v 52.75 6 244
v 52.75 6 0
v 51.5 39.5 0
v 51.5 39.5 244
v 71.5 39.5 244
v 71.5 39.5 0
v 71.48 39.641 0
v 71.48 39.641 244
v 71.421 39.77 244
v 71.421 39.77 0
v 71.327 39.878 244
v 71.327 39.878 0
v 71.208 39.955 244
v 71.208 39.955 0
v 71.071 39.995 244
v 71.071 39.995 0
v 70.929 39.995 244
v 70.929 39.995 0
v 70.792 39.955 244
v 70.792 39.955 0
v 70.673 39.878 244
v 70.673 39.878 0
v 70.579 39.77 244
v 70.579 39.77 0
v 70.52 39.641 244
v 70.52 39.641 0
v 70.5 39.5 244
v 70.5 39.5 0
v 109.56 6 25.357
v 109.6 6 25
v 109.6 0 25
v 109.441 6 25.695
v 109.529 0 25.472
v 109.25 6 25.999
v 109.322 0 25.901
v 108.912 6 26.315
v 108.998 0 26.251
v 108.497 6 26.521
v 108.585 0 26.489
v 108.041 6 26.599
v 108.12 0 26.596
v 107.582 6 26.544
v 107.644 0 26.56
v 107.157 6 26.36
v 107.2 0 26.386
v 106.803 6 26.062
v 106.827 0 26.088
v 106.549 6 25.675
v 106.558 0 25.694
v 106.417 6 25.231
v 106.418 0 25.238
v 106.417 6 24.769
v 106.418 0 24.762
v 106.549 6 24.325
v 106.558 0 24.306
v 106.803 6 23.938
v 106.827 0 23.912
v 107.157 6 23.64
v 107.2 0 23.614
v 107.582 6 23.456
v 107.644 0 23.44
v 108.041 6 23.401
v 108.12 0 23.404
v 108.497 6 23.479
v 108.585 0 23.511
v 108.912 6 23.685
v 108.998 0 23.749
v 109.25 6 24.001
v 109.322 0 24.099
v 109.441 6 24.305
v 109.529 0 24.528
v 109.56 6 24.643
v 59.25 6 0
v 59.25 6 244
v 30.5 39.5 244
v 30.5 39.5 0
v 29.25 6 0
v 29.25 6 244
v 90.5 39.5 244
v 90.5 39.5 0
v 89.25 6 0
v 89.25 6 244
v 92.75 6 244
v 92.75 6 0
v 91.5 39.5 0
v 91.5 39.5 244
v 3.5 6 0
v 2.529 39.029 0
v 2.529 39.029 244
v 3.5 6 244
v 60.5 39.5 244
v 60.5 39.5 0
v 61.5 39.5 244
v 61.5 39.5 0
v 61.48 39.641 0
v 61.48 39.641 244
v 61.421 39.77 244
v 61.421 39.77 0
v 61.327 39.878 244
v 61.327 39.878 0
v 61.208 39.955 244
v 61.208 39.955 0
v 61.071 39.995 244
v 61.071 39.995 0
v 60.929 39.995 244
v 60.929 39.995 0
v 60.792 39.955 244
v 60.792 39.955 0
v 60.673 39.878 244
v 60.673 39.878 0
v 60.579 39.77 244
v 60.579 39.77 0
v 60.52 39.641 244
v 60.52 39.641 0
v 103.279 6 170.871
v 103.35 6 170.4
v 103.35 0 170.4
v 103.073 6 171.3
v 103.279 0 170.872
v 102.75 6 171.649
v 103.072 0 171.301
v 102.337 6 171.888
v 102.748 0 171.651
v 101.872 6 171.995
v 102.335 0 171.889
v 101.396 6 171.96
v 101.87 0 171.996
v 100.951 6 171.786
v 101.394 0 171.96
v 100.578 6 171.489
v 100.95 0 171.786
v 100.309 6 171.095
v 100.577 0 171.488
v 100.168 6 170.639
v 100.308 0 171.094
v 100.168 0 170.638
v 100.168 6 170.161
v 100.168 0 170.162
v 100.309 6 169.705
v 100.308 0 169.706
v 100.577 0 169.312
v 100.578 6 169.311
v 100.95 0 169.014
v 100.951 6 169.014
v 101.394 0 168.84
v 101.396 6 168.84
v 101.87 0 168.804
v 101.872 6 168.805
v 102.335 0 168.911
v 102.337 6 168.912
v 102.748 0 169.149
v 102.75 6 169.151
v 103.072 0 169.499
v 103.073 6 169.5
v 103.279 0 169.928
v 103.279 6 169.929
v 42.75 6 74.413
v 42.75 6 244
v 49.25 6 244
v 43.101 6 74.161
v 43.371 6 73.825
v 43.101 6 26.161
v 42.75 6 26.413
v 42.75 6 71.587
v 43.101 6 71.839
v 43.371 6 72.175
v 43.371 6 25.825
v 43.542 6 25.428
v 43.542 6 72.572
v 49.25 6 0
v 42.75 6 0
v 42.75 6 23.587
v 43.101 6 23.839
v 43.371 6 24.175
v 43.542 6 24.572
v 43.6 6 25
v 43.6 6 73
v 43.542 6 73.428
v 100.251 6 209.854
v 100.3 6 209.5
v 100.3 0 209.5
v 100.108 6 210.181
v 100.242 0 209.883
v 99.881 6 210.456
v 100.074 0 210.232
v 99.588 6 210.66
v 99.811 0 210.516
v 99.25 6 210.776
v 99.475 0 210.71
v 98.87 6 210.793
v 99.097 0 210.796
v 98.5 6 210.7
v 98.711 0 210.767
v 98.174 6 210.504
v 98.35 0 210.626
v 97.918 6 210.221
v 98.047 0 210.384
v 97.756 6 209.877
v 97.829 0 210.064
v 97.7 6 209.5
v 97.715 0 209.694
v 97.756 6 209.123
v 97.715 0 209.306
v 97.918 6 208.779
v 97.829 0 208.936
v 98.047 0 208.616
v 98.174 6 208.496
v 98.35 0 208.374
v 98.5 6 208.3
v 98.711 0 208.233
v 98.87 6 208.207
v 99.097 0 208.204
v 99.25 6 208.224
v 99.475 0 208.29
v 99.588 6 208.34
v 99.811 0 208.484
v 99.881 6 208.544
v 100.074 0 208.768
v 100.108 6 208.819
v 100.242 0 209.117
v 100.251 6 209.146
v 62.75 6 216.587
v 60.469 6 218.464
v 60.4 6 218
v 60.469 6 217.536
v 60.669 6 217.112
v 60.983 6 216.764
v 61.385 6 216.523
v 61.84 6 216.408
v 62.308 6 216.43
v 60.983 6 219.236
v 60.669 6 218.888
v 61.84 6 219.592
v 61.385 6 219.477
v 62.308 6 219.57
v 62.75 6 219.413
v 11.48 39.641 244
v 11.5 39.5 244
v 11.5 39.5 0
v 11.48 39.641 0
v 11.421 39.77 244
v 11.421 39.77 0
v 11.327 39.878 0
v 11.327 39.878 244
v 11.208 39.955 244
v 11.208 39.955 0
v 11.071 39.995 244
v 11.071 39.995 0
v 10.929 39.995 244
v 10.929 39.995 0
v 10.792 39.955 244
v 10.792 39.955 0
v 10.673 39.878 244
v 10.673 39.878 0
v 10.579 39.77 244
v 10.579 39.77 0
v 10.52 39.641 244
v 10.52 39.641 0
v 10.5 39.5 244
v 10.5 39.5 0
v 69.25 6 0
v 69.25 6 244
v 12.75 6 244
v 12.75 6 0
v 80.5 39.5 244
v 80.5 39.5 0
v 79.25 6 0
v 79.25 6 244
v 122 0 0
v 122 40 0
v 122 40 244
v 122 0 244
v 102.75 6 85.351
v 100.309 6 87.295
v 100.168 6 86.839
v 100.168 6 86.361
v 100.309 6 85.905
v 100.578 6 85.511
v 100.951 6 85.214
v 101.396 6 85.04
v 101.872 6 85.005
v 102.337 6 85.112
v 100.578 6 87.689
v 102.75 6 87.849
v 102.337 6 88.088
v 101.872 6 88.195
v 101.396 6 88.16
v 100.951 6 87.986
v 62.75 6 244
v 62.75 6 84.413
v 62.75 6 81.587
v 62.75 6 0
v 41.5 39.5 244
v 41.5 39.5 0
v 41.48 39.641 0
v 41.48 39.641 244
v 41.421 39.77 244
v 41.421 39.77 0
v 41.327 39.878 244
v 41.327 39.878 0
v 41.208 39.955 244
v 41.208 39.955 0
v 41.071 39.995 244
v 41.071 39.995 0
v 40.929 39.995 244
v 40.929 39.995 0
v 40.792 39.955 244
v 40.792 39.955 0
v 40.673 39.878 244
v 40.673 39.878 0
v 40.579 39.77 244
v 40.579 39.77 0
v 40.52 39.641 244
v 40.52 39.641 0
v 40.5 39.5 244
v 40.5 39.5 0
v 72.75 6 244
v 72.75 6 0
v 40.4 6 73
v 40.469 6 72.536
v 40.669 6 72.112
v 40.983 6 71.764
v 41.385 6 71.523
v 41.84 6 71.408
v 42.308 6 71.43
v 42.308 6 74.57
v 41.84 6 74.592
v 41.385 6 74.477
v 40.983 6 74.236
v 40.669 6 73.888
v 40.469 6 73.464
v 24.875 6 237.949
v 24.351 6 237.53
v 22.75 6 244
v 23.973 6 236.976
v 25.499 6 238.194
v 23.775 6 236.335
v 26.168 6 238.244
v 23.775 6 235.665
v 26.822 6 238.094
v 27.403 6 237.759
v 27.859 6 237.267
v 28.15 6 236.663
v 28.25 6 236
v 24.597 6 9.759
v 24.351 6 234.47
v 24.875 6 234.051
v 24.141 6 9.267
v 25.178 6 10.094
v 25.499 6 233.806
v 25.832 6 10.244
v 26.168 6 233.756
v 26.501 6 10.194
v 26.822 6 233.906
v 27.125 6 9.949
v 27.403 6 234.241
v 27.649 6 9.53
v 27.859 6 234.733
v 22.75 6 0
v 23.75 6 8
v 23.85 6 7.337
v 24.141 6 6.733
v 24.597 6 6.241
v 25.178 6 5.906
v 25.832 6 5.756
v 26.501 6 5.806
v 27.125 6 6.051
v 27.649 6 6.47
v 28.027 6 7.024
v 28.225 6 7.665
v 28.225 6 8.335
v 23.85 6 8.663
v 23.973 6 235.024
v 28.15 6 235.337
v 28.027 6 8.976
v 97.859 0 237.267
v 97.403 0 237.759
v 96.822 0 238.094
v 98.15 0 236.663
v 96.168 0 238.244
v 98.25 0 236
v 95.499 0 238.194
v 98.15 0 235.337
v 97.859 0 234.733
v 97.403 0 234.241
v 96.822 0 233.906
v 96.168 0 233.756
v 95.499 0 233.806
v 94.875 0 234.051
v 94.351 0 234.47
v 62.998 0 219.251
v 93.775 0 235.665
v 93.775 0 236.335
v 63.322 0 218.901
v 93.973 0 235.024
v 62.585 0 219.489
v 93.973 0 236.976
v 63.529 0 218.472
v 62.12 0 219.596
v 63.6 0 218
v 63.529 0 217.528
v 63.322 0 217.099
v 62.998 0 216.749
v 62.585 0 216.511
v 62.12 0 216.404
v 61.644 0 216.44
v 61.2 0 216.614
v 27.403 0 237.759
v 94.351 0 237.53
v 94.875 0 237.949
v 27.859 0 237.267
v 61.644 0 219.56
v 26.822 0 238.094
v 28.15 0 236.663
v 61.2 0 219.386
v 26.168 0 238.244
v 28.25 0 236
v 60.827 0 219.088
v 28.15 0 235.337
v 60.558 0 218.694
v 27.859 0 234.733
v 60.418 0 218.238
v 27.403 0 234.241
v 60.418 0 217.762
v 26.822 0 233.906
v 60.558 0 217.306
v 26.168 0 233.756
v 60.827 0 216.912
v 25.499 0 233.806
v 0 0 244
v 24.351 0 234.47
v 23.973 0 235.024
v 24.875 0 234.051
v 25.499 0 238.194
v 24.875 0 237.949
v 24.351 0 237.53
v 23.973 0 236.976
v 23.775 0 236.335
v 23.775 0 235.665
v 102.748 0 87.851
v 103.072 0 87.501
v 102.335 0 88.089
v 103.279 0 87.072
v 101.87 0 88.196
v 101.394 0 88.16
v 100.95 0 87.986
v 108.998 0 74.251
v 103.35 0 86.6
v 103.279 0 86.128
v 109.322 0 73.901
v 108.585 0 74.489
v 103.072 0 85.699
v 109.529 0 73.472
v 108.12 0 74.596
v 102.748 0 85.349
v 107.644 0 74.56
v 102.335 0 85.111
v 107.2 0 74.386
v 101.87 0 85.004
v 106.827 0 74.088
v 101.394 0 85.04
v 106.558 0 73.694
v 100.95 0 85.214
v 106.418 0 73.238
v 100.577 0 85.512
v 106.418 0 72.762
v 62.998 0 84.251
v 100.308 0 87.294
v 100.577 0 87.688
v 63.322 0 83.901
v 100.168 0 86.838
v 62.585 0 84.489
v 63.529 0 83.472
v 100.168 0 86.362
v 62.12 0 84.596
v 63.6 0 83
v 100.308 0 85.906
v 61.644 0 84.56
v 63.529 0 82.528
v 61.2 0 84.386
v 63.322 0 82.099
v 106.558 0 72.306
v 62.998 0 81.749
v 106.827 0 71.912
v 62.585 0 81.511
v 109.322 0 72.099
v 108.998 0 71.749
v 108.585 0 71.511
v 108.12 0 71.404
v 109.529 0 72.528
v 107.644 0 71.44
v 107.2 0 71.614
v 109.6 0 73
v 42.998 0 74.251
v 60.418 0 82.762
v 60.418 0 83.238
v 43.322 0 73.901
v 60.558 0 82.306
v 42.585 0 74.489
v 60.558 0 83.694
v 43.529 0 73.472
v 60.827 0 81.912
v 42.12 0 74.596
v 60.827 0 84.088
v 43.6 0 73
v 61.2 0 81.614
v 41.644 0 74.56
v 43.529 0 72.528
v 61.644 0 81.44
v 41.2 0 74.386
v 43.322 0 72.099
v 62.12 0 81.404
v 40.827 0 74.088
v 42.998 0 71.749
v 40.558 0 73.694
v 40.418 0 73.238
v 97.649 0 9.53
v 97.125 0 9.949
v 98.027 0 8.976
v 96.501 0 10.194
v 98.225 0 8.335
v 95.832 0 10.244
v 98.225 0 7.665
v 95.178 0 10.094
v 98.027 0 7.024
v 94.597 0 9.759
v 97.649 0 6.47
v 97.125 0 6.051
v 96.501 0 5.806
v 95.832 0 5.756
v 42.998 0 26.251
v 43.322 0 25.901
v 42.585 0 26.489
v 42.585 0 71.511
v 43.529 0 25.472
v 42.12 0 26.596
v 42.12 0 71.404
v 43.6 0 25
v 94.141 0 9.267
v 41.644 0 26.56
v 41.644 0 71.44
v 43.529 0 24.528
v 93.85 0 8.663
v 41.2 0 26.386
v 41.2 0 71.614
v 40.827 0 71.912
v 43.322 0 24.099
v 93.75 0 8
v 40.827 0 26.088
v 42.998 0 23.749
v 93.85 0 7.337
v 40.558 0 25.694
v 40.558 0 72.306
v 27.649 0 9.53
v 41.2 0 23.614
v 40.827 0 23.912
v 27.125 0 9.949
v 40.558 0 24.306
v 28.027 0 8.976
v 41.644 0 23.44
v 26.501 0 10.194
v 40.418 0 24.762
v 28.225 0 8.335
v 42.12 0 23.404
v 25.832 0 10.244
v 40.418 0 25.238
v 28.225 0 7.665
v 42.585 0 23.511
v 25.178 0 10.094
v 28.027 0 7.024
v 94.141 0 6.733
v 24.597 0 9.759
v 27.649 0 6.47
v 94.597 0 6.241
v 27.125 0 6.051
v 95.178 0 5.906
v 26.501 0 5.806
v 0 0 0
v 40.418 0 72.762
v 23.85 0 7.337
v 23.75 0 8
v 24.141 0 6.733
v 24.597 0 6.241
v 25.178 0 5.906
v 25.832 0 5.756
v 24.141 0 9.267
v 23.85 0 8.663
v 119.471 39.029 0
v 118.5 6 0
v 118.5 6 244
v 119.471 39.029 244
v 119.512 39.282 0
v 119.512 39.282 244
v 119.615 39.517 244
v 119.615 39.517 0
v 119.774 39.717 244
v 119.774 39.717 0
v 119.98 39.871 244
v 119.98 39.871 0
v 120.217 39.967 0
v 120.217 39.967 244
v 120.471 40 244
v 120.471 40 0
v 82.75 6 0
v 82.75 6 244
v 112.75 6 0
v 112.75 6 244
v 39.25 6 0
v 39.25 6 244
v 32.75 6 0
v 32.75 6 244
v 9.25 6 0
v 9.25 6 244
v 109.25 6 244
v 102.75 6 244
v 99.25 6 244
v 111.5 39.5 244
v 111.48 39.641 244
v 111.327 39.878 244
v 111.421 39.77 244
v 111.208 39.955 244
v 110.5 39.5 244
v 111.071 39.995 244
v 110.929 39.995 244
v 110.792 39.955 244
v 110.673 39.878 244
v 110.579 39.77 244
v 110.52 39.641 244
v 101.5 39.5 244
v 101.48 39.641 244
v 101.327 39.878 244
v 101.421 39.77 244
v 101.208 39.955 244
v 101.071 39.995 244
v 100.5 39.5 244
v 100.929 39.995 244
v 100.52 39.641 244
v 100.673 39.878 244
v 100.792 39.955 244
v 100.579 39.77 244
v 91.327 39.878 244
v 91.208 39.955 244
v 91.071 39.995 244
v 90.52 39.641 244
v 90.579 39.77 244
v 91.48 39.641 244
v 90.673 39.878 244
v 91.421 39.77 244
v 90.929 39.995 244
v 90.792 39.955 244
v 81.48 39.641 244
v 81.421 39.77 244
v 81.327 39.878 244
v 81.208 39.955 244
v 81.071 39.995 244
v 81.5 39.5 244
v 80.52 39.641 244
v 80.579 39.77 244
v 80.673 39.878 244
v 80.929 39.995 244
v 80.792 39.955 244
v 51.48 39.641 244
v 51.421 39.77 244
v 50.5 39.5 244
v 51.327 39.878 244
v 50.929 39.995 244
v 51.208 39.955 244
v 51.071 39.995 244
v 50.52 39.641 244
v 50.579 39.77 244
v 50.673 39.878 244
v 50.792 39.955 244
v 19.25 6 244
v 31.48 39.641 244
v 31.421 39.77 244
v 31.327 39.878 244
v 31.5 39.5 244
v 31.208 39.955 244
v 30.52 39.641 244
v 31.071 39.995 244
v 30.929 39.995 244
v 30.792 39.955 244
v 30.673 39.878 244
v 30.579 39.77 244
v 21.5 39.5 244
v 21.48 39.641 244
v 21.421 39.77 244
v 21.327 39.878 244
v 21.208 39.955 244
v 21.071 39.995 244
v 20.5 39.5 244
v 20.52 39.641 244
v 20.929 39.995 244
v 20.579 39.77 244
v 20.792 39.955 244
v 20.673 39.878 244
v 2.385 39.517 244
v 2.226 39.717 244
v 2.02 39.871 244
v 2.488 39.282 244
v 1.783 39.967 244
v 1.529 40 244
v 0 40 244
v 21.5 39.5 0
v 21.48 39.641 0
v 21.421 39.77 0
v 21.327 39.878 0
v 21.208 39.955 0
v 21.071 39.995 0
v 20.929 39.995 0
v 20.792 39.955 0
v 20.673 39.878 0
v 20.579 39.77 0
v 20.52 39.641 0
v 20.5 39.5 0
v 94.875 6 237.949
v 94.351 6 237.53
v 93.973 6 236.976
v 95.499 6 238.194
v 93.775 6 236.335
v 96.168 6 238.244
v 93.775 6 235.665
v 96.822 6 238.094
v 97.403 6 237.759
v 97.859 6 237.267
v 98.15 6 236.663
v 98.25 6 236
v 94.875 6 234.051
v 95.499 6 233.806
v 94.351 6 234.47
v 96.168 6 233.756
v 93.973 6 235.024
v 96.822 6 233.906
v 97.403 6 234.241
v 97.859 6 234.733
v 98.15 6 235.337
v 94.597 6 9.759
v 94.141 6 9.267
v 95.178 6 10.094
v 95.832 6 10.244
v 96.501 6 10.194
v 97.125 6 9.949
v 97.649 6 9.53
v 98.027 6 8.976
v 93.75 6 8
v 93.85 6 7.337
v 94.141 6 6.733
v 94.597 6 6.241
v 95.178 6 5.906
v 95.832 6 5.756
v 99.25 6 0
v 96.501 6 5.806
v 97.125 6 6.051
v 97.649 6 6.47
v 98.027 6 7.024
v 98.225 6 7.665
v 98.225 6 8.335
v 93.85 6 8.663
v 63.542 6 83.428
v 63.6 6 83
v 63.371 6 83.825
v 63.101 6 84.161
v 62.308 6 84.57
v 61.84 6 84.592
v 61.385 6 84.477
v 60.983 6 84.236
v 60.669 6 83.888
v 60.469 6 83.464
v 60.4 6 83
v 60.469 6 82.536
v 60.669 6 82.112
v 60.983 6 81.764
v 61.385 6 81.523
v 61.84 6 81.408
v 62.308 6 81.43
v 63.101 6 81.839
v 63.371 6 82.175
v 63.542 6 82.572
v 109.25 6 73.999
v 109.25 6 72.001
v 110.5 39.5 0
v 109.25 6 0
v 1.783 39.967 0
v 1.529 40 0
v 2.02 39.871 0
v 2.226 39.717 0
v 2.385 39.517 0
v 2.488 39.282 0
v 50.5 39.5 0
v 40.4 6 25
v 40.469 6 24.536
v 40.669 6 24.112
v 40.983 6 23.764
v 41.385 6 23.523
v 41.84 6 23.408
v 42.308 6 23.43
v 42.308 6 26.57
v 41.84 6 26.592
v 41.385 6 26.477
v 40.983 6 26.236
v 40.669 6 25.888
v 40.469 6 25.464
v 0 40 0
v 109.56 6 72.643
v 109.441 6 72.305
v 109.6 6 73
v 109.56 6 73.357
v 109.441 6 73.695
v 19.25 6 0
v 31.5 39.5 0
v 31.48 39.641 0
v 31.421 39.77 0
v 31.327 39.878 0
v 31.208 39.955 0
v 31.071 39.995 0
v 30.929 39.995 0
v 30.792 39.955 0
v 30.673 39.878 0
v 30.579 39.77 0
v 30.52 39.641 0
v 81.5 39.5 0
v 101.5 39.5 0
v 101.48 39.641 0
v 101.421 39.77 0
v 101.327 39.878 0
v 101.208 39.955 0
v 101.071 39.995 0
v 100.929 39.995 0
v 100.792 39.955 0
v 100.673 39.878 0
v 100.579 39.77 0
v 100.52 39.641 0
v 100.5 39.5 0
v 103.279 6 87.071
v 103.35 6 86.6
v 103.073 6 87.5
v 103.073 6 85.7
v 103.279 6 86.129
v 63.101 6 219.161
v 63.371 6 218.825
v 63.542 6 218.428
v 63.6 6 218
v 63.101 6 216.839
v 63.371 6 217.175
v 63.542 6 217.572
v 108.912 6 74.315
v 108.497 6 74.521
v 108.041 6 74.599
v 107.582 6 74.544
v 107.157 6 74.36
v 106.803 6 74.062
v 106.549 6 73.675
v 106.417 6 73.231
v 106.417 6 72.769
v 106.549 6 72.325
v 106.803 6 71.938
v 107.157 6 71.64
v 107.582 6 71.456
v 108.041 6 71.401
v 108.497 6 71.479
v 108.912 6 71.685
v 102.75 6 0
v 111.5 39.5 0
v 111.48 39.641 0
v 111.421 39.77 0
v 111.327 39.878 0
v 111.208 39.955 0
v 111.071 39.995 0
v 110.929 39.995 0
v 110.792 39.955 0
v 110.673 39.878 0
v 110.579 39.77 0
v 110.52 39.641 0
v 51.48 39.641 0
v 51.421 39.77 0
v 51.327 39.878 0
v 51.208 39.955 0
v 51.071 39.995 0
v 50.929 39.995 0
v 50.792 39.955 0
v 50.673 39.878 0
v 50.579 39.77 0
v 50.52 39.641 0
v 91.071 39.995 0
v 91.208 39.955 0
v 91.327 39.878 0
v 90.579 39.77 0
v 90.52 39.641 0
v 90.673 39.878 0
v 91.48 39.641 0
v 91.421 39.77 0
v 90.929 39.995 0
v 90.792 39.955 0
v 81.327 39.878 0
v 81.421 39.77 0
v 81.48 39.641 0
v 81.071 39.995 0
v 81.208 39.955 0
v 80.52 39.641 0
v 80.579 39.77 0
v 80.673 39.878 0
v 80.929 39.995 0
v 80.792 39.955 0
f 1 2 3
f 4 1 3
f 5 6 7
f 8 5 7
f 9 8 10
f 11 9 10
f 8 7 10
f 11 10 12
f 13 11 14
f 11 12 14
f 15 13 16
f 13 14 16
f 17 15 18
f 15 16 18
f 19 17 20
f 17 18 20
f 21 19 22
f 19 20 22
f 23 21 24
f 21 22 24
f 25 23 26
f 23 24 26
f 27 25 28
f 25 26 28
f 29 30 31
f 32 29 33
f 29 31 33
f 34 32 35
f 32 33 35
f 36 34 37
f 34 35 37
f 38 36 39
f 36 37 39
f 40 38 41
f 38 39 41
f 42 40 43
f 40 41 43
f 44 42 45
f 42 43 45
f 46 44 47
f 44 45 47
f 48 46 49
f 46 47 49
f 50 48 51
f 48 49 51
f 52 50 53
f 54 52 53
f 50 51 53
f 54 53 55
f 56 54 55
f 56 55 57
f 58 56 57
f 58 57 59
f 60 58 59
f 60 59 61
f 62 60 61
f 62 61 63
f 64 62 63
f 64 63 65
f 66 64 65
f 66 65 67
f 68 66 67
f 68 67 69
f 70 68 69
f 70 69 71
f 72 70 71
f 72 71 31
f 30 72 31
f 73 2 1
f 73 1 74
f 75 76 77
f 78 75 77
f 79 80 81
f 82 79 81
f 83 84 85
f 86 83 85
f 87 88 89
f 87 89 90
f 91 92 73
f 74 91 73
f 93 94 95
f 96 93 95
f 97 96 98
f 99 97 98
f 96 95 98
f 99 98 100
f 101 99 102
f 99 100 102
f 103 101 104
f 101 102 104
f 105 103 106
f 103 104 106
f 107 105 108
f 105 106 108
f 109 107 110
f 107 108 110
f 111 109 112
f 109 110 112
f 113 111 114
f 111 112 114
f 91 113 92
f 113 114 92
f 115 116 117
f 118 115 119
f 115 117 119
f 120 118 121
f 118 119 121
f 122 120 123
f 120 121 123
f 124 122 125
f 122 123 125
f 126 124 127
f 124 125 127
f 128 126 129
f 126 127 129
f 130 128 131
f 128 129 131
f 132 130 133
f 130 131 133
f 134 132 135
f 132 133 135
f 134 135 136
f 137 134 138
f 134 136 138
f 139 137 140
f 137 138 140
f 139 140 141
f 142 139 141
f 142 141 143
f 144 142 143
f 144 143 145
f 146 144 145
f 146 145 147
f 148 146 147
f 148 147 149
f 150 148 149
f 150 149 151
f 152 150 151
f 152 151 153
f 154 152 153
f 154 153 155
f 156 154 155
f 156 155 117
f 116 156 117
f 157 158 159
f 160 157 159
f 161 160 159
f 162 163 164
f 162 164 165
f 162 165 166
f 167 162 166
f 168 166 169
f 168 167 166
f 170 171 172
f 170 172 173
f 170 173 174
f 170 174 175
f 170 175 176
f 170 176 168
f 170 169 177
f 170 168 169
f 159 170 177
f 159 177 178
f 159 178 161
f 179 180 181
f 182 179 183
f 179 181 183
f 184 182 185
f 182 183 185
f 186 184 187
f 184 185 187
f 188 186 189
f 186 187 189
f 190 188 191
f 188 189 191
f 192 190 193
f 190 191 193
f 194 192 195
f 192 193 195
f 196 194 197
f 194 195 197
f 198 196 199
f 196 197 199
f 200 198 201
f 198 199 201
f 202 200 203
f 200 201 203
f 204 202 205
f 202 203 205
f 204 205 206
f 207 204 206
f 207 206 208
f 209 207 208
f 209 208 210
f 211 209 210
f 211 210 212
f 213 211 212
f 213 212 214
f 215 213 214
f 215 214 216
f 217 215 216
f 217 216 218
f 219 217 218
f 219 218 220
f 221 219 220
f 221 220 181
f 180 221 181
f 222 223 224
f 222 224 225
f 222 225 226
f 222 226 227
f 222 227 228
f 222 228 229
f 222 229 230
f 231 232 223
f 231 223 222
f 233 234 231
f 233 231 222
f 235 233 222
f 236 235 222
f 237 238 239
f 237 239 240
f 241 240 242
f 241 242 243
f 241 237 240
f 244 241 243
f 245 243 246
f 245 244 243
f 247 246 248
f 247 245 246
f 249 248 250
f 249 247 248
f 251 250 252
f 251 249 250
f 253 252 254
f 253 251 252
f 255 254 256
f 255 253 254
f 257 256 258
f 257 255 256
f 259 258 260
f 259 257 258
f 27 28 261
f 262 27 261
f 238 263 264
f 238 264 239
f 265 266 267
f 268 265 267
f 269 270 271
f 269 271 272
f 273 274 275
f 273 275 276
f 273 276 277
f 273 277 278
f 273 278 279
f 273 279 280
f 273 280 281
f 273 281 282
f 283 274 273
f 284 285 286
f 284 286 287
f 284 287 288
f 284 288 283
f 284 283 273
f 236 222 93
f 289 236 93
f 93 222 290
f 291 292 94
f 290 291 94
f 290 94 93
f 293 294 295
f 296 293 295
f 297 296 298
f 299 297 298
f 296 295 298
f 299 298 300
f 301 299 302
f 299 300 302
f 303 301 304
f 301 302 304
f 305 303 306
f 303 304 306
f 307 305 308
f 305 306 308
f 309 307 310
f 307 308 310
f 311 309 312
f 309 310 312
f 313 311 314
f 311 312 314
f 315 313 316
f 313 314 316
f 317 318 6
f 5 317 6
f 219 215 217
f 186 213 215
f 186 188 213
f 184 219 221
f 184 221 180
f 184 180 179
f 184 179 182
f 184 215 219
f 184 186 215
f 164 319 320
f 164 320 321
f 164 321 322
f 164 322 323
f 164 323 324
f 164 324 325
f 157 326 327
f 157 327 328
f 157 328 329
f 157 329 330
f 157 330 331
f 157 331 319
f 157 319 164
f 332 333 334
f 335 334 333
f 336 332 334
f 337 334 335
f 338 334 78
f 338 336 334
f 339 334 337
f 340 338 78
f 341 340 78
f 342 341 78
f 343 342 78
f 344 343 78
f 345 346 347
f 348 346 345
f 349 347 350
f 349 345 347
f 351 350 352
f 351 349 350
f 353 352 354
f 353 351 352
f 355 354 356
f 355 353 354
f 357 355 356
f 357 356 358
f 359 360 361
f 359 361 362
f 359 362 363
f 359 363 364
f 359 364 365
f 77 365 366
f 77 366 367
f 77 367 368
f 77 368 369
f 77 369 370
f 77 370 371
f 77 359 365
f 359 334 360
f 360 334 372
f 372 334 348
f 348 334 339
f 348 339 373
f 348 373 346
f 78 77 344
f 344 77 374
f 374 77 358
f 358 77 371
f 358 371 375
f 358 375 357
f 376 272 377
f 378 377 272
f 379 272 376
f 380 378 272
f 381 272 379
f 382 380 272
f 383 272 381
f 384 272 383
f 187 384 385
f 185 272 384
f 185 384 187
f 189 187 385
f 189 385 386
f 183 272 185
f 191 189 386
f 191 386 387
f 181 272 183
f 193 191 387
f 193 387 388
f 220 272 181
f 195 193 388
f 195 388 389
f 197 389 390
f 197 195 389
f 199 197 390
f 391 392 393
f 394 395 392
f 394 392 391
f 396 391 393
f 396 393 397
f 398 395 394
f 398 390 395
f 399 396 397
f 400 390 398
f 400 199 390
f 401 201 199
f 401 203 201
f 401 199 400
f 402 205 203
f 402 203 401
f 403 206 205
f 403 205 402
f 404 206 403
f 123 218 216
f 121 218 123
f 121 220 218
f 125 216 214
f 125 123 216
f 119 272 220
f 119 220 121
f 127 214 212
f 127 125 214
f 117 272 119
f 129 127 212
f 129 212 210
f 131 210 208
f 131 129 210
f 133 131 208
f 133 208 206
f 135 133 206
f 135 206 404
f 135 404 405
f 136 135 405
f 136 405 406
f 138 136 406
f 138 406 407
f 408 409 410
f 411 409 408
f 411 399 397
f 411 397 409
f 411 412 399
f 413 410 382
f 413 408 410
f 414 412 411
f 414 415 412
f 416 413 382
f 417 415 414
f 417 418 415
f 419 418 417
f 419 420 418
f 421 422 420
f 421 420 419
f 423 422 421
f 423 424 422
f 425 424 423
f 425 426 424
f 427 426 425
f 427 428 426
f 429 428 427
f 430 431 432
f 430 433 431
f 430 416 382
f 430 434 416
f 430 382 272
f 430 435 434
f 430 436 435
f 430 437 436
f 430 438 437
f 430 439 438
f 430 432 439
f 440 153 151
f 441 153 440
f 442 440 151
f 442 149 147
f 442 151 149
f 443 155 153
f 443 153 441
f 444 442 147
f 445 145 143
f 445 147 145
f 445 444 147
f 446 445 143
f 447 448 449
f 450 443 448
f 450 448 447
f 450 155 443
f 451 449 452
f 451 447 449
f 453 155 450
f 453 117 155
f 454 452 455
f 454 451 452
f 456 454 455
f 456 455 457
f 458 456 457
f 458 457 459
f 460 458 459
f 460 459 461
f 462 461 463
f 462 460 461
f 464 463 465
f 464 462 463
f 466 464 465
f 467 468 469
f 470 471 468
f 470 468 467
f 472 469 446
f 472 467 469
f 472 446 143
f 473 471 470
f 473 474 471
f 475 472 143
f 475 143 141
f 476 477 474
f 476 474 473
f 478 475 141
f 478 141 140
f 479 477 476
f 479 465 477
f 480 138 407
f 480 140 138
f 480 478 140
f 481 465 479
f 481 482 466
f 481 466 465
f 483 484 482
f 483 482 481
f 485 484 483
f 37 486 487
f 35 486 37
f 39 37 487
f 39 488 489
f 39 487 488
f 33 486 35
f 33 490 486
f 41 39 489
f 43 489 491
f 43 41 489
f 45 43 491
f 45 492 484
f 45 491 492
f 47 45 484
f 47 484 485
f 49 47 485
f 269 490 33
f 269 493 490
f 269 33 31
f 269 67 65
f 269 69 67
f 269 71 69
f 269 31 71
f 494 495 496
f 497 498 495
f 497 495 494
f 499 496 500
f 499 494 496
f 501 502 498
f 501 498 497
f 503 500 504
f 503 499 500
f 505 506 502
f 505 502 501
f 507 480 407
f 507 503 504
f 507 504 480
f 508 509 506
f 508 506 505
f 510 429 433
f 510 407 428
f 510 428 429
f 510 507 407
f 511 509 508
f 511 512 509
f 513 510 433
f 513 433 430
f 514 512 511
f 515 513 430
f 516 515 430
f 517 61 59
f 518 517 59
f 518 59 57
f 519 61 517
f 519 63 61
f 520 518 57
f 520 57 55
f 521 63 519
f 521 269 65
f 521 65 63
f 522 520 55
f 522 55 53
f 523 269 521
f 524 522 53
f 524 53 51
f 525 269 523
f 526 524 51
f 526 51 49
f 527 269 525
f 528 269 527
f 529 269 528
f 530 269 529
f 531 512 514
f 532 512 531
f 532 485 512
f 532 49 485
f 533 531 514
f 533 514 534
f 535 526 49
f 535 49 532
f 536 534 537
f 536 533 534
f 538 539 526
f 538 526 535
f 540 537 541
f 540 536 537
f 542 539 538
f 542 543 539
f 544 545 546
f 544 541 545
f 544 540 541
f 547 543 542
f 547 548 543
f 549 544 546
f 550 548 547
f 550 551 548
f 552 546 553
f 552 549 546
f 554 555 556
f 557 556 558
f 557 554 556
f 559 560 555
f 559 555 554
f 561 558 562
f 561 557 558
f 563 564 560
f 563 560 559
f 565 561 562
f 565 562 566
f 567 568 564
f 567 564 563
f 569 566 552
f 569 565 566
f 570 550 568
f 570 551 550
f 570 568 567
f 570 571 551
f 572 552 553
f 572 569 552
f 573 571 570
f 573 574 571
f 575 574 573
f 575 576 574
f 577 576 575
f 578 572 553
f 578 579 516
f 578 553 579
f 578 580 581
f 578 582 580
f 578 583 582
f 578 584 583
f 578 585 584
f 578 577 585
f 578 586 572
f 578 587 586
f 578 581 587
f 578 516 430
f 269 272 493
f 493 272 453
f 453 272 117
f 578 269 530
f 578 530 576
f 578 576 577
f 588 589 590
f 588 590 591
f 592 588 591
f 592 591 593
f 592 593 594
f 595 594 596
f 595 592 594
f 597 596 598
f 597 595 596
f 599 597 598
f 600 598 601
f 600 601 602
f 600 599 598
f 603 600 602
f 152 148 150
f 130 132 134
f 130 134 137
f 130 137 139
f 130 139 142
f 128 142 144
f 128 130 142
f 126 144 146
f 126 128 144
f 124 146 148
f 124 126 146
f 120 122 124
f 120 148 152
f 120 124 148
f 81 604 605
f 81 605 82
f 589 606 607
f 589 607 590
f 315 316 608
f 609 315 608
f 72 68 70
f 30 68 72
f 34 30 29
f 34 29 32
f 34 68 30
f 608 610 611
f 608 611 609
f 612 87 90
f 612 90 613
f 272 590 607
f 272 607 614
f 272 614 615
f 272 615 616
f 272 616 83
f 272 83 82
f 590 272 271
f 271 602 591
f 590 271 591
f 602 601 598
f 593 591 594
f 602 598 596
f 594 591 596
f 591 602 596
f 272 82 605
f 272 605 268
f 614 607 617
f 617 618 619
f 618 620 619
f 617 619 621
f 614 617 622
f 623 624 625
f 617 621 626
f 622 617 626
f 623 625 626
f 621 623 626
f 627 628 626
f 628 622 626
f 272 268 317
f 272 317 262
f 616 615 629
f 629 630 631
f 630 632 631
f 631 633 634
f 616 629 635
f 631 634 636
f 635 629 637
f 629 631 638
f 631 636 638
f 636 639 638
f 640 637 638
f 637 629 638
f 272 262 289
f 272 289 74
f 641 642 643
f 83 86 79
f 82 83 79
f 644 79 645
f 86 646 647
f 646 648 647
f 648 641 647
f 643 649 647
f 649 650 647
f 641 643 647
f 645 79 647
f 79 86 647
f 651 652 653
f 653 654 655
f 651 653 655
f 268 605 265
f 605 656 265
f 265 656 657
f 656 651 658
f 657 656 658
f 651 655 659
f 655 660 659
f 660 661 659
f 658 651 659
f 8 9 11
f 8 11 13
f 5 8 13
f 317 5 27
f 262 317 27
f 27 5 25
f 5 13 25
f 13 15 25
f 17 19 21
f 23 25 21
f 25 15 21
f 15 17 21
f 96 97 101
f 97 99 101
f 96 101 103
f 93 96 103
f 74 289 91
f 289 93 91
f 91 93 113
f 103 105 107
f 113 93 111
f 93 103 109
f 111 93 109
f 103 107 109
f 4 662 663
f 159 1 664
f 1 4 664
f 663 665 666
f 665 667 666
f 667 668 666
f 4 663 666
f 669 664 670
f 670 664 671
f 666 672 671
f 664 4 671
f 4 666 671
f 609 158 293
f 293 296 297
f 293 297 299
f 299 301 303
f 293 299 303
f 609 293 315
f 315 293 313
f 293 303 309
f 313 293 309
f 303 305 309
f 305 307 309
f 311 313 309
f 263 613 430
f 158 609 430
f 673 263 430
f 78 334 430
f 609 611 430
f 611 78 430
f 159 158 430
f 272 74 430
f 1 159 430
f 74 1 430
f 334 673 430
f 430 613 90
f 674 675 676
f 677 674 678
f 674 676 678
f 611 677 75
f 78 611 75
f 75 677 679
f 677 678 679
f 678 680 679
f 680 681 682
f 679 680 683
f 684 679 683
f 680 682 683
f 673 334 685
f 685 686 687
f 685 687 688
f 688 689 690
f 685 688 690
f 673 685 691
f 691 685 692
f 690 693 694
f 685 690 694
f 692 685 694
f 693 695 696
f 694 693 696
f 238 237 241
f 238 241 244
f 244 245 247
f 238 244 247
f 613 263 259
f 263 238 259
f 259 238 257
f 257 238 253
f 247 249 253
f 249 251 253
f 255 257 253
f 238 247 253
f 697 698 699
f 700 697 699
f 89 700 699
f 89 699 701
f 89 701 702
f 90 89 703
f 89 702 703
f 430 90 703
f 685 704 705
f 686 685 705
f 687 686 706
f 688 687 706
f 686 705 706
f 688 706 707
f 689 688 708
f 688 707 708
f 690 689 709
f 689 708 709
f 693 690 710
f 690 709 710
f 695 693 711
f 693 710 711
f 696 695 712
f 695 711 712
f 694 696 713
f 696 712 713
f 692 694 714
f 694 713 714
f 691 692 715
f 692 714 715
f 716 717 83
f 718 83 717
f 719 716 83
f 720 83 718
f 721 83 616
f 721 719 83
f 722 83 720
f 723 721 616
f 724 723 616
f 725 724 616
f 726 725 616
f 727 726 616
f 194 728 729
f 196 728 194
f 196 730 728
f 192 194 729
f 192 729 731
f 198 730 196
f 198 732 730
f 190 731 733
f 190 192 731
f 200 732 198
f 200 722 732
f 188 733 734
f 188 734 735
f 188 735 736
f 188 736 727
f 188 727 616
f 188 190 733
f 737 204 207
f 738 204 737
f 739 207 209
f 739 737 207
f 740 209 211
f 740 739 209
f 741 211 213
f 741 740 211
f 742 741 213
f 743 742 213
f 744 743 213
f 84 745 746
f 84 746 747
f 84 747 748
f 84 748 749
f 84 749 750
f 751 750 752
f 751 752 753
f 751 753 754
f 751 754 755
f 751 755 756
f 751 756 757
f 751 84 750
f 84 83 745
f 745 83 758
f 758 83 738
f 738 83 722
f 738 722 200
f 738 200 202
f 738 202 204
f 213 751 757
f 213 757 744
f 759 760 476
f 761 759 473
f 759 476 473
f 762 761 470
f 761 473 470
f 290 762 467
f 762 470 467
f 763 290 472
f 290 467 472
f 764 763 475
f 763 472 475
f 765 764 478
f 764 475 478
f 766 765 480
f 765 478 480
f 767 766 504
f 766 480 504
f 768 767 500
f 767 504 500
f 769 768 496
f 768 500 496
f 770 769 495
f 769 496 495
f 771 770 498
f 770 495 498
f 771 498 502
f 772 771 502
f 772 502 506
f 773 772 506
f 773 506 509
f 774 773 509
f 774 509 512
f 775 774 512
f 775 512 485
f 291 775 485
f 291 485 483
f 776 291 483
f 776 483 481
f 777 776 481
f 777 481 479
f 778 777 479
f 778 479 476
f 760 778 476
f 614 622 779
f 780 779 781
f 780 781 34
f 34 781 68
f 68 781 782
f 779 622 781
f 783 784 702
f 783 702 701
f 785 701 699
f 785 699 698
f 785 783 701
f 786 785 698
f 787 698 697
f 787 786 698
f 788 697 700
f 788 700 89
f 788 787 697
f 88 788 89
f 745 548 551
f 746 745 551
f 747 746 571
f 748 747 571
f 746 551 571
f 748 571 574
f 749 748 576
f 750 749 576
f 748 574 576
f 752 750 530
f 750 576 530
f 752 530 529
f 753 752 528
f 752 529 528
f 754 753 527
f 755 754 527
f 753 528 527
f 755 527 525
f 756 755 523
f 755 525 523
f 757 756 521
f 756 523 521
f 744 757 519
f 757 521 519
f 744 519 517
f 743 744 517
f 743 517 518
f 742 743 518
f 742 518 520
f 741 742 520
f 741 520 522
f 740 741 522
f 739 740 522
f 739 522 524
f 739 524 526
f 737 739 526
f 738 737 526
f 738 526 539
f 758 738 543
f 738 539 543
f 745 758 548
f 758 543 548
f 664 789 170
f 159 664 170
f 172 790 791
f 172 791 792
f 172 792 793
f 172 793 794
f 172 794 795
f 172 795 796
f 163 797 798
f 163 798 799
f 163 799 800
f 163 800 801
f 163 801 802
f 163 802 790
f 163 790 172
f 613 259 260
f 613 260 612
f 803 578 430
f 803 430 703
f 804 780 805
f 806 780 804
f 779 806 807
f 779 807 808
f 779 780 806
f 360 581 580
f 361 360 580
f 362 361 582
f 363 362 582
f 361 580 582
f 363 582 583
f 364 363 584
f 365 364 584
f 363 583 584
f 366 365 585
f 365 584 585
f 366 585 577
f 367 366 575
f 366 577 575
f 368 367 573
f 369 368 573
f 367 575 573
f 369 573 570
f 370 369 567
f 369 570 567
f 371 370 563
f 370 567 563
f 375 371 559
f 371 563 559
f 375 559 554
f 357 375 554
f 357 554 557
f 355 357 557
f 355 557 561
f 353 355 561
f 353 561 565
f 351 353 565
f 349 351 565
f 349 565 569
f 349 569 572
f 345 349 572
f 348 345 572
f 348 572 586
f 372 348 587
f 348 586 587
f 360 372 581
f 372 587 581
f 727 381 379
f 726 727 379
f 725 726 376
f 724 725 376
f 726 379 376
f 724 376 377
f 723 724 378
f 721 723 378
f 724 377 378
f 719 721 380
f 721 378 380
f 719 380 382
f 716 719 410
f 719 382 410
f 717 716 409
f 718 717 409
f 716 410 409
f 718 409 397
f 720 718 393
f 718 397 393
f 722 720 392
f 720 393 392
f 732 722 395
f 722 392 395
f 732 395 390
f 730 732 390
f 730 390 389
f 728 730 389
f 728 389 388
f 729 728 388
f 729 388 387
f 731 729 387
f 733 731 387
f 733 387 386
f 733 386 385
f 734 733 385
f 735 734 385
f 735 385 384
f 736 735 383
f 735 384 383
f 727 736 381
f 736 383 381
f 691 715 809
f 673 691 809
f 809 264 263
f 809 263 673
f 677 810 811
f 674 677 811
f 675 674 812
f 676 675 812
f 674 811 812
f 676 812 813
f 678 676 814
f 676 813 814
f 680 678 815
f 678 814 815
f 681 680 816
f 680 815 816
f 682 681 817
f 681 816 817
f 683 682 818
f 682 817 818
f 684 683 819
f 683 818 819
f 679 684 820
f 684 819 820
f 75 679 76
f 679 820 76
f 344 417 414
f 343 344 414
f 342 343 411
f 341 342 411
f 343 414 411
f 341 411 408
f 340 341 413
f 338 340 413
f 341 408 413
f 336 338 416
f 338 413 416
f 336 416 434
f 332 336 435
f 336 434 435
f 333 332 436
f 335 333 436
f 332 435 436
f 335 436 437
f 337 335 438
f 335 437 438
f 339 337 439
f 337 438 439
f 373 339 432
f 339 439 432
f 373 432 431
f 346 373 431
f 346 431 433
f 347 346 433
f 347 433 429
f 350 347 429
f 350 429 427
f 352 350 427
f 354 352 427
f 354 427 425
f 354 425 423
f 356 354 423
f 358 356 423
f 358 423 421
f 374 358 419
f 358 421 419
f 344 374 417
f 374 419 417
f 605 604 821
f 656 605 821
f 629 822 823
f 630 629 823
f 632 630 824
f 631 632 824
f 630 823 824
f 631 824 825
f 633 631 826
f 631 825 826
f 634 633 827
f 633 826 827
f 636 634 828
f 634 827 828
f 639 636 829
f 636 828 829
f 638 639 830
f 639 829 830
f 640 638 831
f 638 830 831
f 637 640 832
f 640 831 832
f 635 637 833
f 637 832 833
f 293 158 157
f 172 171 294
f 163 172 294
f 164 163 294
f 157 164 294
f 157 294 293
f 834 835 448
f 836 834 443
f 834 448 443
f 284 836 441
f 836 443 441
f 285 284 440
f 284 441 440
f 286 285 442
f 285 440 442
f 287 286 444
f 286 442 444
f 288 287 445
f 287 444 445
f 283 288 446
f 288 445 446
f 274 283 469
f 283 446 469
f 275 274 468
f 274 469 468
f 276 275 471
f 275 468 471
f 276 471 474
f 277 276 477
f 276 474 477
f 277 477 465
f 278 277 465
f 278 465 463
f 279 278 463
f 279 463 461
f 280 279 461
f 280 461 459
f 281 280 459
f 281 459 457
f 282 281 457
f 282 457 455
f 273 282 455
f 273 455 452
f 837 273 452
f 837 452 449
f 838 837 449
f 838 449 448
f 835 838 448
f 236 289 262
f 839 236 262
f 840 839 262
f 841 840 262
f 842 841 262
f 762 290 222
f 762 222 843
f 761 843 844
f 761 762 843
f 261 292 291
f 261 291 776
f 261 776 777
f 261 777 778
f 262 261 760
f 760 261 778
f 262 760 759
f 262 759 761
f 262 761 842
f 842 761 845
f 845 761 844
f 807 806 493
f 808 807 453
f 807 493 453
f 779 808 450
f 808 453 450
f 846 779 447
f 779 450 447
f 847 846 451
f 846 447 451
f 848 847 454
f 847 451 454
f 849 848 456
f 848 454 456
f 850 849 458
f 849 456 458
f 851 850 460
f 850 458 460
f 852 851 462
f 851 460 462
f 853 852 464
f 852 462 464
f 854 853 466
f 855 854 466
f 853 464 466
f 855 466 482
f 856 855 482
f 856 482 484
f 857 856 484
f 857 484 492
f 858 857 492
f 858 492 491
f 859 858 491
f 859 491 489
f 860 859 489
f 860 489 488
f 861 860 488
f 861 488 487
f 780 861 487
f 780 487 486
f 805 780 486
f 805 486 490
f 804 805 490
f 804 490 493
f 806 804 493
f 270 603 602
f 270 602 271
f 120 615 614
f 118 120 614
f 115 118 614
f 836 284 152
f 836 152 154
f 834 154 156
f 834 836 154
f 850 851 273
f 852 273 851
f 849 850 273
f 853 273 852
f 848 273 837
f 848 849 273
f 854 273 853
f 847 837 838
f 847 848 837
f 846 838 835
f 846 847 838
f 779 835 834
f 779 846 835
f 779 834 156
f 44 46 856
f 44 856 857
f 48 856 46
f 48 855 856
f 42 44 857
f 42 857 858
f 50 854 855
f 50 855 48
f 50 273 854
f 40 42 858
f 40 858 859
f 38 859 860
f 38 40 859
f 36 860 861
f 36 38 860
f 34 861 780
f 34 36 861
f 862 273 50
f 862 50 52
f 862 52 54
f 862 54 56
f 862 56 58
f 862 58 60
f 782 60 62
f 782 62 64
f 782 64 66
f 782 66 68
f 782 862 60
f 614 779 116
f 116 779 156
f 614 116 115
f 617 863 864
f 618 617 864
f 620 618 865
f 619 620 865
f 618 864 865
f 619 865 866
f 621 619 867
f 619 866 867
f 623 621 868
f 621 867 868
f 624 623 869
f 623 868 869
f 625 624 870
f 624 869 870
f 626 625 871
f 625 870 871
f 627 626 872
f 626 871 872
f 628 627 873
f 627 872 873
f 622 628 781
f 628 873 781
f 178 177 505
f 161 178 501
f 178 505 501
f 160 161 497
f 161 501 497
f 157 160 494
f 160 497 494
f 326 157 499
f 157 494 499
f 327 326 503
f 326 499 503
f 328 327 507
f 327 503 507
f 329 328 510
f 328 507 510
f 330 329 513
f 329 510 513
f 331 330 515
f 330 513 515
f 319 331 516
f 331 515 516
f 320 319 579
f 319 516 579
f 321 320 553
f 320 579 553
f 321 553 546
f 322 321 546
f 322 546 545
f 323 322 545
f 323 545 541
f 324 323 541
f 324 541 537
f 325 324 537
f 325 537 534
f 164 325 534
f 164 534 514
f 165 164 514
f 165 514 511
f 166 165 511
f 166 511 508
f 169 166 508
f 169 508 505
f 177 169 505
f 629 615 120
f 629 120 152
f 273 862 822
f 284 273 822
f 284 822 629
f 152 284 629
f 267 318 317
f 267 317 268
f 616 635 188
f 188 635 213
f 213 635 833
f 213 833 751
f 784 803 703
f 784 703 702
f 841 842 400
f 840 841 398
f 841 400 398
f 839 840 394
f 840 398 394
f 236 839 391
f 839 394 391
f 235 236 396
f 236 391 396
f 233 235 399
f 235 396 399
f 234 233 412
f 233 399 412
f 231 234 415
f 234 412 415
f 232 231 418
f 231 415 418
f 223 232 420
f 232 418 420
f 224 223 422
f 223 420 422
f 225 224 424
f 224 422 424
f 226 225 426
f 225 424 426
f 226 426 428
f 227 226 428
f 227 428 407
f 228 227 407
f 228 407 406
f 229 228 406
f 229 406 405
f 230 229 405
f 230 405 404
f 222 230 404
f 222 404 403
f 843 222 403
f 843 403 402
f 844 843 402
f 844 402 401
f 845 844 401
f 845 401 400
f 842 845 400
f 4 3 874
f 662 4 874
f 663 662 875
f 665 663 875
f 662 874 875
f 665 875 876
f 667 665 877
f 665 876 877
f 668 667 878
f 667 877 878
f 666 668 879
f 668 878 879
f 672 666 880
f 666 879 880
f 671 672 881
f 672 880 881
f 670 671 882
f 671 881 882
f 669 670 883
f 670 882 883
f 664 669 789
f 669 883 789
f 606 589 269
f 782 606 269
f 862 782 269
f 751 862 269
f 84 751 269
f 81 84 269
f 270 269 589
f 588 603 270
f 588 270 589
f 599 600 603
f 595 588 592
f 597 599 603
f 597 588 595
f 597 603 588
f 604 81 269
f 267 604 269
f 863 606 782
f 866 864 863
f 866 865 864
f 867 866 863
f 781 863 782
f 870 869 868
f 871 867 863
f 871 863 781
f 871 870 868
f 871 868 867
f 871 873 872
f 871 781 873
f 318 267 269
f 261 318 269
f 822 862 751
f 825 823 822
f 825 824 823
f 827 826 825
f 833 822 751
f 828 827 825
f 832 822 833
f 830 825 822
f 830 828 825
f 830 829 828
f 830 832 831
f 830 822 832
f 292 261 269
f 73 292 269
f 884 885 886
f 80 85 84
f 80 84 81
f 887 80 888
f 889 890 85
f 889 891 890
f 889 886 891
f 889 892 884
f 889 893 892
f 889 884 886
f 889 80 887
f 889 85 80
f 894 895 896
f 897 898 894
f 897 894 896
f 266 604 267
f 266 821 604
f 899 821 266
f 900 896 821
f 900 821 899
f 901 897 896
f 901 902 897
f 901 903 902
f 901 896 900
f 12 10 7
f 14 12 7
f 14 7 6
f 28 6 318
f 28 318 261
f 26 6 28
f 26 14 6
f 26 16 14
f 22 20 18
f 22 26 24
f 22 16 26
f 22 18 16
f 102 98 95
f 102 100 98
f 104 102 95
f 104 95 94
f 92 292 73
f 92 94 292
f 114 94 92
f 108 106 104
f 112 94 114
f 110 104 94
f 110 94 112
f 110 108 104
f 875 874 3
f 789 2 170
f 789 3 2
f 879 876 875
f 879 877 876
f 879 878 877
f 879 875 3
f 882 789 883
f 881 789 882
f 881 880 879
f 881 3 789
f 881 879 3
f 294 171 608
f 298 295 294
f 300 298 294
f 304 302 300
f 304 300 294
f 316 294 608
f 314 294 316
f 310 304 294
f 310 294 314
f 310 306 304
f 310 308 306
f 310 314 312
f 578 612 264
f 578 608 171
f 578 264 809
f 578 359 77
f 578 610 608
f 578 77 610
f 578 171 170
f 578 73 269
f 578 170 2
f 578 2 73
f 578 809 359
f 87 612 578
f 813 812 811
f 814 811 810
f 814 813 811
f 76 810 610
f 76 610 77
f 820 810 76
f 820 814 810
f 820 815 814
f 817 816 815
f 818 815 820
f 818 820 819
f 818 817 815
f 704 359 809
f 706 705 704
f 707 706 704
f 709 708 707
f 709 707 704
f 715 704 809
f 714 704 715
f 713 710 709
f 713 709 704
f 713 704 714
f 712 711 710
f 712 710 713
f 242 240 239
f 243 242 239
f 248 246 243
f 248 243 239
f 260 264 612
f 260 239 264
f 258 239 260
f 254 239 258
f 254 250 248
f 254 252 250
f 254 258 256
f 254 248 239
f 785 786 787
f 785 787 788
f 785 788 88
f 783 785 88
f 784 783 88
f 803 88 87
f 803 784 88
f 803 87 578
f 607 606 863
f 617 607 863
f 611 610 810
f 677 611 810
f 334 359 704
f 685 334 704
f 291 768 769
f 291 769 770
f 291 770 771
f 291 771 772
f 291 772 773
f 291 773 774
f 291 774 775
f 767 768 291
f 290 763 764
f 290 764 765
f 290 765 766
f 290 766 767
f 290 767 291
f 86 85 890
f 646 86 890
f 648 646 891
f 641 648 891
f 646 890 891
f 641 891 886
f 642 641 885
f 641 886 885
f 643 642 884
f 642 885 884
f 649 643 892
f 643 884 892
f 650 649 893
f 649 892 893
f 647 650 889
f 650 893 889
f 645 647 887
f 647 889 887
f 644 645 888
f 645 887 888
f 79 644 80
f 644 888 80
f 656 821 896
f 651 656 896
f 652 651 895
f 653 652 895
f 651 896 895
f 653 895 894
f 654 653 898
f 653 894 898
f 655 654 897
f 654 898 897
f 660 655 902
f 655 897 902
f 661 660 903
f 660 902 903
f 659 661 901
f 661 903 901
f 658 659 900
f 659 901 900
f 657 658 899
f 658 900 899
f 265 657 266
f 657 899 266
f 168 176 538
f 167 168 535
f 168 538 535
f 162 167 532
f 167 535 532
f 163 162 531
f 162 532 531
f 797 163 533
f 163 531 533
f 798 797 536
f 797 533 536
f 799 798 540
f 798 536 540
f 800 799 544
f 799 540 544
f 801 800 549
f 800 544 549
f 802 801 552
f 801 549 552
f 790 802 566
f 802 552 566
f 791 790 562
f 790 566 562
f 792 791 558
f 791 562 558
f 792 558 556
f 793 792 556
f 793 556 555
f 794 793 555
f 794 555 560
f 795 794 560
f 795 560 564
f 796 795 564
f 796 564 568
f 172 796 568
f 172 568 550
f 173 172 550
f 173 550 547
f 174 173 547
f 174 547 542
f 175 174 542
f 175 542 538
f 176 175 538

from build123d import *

# Parameters (mm, degrees)
EXTRUDE_1_DEPTH       = 244
EXTRUDE_3_DEPTH       = 244
PATTERN_CURVE_1_COUNT = 11
PATTERN_CURVE_1_PITCH = 10
SKETCH_3_R            = 2.25
CUT_EXTRUDE_1_DEPTH   = 6
SKETCH_4_R            = 1.6
SKETCH_4_R_2          = 1.3
CUT_EXTRUDE_2_DEPTH   = 6


with BuildPart() as part:
    # Эскиз1 → Вытянуть1 (new body)
    with BuildSketch(Plane.XY):
        with BuildLine():
            Line((0, 40), (1.528979332, 40))
            ThreePointArc((1.528979332, 40), (2.225614441, 39.717425624), (2.528547087, 39.029399052))
            Line((2.528547087, 39.029399052), (3.5, 6))
            Line((3.5, 6), (118.5, 6))
            Line((118.5, 6), (119.471452913, 39.029399052))
            ThreePointArc((119.471452913, 39.029399052), (119.774385559, 39.717425624), (120.471020668, 40))
            Line((120.471020668, 40), (122, 40))
            Line((122, 40), (122, 0))
            Line((122, 0), (0, 0))
            Line((0, 0), (0, 40))
        make_face()
    extrude(amount=EXTRUDE_1_DEPTH)

    # Эскиз2 → Вытянуть3 (add)
    with BuildSketch(Plane.XY.offset(244)):
        with BuildLine():
            Line((10.5, 39.5), (9.25, 6))
            Line((9.25, 6), (12.75, 6))
            Line((12.75, 6), (11.5, 39.5))
            ThreePointArc((11.5, 39.5), (11, 40), (10.5, 39.5))
        make_face()
    extrude_3 = extrude(amount=-EXTRUDE_3_DEPTH)

    # Кривая1: Вытянуть3 ×11
    with Locations(*[(i * PATTERN_CURVE_1_PITCH, 0, 0) for i in range(1, PATTERN_CURVE_1_COUNT)]):
        add(extrude_3)

    # Эскиз3 → Вырез-Вытянуть1 (cut)
    with BuildSketch(Plane.XZ):
        with Locations((26, 236)):
            Circle(SKETCH_3_R)
        with Locations((96, 236)):
            Circle(SKETCH_3_R)
        with Locations((96, 8)):
            Circle(SKETCH_3_R)
        with Locations((26, 8)):
            Circle(SKETCH_3_R)
    extrude(amount=-CUT_EXTRUDE_1_DEPTH, mode=Mode.SUBTRACT)

    # Эскиз4 → Вырез-Вытянуть2 (cut)
    with BuildSketch(Plane(origin=(133.240090243, 0, 310.149074448), x_dir=(-1, 0, 0), z_dir=(0, -1, 0))):
        with Locations((71.240090243, 92.149074448)):
            Circle(SKETCH_4_R)
        with Locations((71.240090243, 227.149074448)):
            Circle(SKETCH_4_R)
        with Locations((31.490090243, 223.549074448)):
            Circle(SKETCH_4_R)
        with Locations((31.490090243, 139.749074448)):
            Circle(SKETCH_4_R)
        with Locations((34.240090243, 100.649074448)):
            Circle(SKETCH_4_R_2)
        with Locations((91.240090243, 285.149074448)):
            Circle(SKETCH_4_R)
        with Locations((91.240090243, 237.149074448)):
            Circle(SKETCH_4_R)
        with Locations((25.240090243, 237.149074448)):
            Circle(SKETCH_4_R)
        with Locations((25.240090243, 285.149074448)):
            Circle(SKETCH_4_R)
    extrude(amount=-CUT_EXTRUDE_2_DEPTH, mode=Mode.SUBTRACT)


solid = part.part
